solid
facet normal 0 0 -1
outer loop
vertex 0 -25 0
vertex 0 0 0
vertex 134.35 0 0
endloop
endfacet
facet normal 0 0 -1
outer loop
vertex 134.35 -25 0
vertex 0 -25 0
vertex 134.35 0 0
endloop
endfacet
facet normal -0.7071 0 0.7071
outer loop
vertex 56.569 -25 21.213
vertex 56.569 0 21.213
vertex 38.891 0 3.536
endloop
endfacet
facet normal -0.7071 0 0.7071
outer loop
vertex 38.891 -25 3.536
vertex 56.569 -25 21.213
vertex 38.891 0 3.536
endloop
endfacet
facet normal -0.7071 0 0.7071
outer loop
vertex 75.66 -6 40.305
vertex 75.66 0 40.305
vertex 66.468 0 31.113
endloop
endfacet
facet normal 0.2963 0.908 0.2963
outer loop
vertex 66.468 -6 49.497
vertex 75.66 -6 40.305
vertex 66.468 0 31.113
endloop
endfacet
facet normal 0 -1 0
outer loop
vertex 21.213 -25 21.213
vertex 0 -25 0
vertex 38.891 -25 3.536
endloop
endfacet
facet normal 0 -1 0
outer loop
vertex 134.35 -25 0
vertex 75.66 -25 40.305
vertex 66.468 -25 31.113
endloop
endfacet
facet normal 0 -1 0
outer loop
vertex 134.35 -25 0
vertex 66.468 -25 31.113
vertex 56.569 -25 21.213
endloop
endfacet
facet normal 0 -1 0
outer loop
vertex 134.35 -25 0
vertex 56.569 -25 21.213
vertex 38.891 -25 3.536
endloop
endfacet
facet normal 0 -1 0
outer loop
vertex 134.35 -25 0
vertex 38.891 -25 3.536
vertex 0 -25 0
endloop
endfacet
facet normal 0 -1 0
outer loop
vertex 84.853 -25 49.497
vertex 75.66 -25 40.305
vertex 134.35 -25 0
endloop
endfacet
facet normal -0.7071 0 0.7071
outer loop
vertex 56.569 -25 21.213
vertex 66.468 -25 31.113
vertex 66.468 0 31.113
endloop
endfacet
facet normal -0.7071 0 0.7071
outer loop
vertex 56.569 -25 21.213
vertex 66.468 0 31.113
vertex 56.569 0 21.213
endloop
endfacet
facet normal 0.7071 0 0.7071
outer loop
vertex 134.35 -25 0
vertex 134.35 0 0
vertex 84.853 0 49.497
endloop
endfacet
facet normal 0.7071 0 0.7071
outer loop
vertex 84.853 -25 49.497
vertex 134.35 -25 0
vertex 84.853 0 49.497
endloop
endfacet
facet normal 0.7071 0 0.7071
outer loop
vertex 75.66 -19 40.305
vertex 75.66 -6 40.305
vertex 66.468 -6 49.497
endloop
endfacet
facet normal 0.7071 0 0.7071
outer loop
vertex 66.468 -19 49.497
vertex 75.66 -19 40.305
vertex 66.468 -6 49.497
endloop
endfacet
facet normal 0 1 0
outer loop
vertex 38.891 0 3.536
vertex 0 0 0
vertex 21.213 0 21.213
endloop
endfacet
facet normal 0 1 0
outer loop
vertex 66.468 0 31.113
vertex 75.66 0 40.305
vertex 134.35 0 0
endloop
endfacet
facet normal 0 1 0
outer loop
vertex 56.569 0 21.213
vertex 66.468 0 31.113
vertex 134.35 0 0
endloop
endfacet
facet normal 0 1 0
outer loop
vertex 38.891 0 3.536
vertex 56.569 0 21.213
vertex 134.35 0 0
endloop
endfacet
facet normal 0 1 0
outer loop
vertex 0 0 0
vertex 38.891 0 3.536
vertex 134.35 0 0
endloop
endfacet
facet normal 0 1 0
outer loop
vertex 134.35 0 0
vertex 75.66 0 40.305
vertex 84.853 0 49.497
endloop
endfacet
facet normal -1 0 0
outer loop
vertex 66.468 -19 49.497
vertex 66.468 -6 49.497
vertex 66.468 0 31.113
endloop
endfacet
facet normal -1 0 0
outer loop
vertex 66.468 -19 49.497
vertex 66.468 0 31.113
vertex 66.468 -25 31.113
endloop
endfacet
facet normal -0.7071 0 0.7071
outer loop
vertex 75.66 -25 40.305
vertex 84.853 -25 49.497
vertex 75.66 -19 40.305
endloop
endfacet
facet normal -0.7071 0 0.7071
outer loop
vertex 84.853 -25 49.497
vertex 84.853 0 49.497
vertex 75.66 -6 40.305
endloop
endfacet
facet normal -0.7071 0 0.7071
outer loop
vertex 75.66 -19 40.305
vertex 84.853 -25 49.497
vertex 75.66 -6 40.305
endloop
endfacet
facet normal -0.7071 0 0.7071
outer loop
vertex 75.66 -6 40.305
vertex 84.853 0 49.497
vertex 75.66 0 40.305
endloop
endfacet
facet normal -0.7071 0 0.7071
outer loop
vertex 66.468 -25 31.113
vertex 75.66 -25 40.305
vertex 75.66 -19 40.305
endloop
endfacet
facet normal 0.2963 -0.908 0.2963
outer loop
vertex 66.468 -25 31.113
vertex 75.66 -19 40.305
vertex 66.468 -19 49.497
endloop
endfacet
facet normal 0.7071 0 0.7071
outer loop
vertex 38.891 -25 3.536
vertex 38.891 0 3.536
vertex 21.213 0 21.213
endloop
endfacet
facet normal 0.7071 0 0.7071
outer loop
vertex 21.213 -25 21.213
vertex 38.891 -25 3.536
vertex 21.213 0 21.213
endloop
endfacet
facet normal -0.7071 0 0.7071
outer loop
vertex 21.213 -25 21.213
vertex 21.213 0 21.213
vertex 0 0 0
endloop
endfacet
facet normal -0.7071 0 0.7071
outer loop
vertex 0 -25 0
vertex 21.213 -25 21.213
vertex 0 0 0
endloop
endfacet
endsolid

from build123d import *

# Parameters (mm, degrees)
F1_DEPTH    = 25
F2_T1_DEPTH = 46.6847527524
F3_SIZE     = 12.99999


# Not quite as in the source:
# - a fillet or chamfer that OpenCascade refuses, or shapes differently, is made with other operations: its cross-section is extruded or revolved along the edge and cut away or added
# - a fillet or chamfer is up to 0.001 mm smaller than in the source, because OpenCascade refuses the exact size


with BuildPart() as f1:
    # F0 (on Front) → F1 (new body)
    with BuildSketch(Plane.XZ):
        Polygon((21.2132034356, 21.2132034356), (0, 0), (134.3502884254, 0), (84.8528137424, 49.4974746831), (75.660425587, 40.3050865276), (66.4680374315, 31.1126983722), (56.5685424949, 21.2132034356), (38.8908729653, 3.5355339059), align=None)
        Polygon((66.4680374315, 31.1126983722), (75.660425587, 40.3050865276), (66.4680374315, 49.4974746831), (57.2756492761, 40.3050865276), align=None)
    extrude(amount=F1_DEPTH)

    # F2: chamfer of 6 x 13 on 2 edges, made by hand

    # F2_s2 → F2_t1 (cut)
    with BuildSketch(Plane(origin=(17.6776695297, 0, -17.6776695297), x_dir=(0, 1, 0), z_dir=(-0.7071067812, 0, 0.7071067812))):
        Polygon((-19, -82), (-25, -69), (-25, -82), align=None)
        Polygon((-6, -82), (0, -69), (0, -82), align=None)
    extrude(amount=F2_T1_DEPTH, mode=Mode.SUBTRACT)

    # F3 (size 13 in the source; OpenCascade refuses exactly that, so slightly less here)
    f3_edges = [f1.edges().sort_by_distance(p)[0] for p in [
        (57.275649, -12.5, 40.305087),
    ]]
    chamfer(f3_edges, length=F3_SIZE)


solid = f1.part
